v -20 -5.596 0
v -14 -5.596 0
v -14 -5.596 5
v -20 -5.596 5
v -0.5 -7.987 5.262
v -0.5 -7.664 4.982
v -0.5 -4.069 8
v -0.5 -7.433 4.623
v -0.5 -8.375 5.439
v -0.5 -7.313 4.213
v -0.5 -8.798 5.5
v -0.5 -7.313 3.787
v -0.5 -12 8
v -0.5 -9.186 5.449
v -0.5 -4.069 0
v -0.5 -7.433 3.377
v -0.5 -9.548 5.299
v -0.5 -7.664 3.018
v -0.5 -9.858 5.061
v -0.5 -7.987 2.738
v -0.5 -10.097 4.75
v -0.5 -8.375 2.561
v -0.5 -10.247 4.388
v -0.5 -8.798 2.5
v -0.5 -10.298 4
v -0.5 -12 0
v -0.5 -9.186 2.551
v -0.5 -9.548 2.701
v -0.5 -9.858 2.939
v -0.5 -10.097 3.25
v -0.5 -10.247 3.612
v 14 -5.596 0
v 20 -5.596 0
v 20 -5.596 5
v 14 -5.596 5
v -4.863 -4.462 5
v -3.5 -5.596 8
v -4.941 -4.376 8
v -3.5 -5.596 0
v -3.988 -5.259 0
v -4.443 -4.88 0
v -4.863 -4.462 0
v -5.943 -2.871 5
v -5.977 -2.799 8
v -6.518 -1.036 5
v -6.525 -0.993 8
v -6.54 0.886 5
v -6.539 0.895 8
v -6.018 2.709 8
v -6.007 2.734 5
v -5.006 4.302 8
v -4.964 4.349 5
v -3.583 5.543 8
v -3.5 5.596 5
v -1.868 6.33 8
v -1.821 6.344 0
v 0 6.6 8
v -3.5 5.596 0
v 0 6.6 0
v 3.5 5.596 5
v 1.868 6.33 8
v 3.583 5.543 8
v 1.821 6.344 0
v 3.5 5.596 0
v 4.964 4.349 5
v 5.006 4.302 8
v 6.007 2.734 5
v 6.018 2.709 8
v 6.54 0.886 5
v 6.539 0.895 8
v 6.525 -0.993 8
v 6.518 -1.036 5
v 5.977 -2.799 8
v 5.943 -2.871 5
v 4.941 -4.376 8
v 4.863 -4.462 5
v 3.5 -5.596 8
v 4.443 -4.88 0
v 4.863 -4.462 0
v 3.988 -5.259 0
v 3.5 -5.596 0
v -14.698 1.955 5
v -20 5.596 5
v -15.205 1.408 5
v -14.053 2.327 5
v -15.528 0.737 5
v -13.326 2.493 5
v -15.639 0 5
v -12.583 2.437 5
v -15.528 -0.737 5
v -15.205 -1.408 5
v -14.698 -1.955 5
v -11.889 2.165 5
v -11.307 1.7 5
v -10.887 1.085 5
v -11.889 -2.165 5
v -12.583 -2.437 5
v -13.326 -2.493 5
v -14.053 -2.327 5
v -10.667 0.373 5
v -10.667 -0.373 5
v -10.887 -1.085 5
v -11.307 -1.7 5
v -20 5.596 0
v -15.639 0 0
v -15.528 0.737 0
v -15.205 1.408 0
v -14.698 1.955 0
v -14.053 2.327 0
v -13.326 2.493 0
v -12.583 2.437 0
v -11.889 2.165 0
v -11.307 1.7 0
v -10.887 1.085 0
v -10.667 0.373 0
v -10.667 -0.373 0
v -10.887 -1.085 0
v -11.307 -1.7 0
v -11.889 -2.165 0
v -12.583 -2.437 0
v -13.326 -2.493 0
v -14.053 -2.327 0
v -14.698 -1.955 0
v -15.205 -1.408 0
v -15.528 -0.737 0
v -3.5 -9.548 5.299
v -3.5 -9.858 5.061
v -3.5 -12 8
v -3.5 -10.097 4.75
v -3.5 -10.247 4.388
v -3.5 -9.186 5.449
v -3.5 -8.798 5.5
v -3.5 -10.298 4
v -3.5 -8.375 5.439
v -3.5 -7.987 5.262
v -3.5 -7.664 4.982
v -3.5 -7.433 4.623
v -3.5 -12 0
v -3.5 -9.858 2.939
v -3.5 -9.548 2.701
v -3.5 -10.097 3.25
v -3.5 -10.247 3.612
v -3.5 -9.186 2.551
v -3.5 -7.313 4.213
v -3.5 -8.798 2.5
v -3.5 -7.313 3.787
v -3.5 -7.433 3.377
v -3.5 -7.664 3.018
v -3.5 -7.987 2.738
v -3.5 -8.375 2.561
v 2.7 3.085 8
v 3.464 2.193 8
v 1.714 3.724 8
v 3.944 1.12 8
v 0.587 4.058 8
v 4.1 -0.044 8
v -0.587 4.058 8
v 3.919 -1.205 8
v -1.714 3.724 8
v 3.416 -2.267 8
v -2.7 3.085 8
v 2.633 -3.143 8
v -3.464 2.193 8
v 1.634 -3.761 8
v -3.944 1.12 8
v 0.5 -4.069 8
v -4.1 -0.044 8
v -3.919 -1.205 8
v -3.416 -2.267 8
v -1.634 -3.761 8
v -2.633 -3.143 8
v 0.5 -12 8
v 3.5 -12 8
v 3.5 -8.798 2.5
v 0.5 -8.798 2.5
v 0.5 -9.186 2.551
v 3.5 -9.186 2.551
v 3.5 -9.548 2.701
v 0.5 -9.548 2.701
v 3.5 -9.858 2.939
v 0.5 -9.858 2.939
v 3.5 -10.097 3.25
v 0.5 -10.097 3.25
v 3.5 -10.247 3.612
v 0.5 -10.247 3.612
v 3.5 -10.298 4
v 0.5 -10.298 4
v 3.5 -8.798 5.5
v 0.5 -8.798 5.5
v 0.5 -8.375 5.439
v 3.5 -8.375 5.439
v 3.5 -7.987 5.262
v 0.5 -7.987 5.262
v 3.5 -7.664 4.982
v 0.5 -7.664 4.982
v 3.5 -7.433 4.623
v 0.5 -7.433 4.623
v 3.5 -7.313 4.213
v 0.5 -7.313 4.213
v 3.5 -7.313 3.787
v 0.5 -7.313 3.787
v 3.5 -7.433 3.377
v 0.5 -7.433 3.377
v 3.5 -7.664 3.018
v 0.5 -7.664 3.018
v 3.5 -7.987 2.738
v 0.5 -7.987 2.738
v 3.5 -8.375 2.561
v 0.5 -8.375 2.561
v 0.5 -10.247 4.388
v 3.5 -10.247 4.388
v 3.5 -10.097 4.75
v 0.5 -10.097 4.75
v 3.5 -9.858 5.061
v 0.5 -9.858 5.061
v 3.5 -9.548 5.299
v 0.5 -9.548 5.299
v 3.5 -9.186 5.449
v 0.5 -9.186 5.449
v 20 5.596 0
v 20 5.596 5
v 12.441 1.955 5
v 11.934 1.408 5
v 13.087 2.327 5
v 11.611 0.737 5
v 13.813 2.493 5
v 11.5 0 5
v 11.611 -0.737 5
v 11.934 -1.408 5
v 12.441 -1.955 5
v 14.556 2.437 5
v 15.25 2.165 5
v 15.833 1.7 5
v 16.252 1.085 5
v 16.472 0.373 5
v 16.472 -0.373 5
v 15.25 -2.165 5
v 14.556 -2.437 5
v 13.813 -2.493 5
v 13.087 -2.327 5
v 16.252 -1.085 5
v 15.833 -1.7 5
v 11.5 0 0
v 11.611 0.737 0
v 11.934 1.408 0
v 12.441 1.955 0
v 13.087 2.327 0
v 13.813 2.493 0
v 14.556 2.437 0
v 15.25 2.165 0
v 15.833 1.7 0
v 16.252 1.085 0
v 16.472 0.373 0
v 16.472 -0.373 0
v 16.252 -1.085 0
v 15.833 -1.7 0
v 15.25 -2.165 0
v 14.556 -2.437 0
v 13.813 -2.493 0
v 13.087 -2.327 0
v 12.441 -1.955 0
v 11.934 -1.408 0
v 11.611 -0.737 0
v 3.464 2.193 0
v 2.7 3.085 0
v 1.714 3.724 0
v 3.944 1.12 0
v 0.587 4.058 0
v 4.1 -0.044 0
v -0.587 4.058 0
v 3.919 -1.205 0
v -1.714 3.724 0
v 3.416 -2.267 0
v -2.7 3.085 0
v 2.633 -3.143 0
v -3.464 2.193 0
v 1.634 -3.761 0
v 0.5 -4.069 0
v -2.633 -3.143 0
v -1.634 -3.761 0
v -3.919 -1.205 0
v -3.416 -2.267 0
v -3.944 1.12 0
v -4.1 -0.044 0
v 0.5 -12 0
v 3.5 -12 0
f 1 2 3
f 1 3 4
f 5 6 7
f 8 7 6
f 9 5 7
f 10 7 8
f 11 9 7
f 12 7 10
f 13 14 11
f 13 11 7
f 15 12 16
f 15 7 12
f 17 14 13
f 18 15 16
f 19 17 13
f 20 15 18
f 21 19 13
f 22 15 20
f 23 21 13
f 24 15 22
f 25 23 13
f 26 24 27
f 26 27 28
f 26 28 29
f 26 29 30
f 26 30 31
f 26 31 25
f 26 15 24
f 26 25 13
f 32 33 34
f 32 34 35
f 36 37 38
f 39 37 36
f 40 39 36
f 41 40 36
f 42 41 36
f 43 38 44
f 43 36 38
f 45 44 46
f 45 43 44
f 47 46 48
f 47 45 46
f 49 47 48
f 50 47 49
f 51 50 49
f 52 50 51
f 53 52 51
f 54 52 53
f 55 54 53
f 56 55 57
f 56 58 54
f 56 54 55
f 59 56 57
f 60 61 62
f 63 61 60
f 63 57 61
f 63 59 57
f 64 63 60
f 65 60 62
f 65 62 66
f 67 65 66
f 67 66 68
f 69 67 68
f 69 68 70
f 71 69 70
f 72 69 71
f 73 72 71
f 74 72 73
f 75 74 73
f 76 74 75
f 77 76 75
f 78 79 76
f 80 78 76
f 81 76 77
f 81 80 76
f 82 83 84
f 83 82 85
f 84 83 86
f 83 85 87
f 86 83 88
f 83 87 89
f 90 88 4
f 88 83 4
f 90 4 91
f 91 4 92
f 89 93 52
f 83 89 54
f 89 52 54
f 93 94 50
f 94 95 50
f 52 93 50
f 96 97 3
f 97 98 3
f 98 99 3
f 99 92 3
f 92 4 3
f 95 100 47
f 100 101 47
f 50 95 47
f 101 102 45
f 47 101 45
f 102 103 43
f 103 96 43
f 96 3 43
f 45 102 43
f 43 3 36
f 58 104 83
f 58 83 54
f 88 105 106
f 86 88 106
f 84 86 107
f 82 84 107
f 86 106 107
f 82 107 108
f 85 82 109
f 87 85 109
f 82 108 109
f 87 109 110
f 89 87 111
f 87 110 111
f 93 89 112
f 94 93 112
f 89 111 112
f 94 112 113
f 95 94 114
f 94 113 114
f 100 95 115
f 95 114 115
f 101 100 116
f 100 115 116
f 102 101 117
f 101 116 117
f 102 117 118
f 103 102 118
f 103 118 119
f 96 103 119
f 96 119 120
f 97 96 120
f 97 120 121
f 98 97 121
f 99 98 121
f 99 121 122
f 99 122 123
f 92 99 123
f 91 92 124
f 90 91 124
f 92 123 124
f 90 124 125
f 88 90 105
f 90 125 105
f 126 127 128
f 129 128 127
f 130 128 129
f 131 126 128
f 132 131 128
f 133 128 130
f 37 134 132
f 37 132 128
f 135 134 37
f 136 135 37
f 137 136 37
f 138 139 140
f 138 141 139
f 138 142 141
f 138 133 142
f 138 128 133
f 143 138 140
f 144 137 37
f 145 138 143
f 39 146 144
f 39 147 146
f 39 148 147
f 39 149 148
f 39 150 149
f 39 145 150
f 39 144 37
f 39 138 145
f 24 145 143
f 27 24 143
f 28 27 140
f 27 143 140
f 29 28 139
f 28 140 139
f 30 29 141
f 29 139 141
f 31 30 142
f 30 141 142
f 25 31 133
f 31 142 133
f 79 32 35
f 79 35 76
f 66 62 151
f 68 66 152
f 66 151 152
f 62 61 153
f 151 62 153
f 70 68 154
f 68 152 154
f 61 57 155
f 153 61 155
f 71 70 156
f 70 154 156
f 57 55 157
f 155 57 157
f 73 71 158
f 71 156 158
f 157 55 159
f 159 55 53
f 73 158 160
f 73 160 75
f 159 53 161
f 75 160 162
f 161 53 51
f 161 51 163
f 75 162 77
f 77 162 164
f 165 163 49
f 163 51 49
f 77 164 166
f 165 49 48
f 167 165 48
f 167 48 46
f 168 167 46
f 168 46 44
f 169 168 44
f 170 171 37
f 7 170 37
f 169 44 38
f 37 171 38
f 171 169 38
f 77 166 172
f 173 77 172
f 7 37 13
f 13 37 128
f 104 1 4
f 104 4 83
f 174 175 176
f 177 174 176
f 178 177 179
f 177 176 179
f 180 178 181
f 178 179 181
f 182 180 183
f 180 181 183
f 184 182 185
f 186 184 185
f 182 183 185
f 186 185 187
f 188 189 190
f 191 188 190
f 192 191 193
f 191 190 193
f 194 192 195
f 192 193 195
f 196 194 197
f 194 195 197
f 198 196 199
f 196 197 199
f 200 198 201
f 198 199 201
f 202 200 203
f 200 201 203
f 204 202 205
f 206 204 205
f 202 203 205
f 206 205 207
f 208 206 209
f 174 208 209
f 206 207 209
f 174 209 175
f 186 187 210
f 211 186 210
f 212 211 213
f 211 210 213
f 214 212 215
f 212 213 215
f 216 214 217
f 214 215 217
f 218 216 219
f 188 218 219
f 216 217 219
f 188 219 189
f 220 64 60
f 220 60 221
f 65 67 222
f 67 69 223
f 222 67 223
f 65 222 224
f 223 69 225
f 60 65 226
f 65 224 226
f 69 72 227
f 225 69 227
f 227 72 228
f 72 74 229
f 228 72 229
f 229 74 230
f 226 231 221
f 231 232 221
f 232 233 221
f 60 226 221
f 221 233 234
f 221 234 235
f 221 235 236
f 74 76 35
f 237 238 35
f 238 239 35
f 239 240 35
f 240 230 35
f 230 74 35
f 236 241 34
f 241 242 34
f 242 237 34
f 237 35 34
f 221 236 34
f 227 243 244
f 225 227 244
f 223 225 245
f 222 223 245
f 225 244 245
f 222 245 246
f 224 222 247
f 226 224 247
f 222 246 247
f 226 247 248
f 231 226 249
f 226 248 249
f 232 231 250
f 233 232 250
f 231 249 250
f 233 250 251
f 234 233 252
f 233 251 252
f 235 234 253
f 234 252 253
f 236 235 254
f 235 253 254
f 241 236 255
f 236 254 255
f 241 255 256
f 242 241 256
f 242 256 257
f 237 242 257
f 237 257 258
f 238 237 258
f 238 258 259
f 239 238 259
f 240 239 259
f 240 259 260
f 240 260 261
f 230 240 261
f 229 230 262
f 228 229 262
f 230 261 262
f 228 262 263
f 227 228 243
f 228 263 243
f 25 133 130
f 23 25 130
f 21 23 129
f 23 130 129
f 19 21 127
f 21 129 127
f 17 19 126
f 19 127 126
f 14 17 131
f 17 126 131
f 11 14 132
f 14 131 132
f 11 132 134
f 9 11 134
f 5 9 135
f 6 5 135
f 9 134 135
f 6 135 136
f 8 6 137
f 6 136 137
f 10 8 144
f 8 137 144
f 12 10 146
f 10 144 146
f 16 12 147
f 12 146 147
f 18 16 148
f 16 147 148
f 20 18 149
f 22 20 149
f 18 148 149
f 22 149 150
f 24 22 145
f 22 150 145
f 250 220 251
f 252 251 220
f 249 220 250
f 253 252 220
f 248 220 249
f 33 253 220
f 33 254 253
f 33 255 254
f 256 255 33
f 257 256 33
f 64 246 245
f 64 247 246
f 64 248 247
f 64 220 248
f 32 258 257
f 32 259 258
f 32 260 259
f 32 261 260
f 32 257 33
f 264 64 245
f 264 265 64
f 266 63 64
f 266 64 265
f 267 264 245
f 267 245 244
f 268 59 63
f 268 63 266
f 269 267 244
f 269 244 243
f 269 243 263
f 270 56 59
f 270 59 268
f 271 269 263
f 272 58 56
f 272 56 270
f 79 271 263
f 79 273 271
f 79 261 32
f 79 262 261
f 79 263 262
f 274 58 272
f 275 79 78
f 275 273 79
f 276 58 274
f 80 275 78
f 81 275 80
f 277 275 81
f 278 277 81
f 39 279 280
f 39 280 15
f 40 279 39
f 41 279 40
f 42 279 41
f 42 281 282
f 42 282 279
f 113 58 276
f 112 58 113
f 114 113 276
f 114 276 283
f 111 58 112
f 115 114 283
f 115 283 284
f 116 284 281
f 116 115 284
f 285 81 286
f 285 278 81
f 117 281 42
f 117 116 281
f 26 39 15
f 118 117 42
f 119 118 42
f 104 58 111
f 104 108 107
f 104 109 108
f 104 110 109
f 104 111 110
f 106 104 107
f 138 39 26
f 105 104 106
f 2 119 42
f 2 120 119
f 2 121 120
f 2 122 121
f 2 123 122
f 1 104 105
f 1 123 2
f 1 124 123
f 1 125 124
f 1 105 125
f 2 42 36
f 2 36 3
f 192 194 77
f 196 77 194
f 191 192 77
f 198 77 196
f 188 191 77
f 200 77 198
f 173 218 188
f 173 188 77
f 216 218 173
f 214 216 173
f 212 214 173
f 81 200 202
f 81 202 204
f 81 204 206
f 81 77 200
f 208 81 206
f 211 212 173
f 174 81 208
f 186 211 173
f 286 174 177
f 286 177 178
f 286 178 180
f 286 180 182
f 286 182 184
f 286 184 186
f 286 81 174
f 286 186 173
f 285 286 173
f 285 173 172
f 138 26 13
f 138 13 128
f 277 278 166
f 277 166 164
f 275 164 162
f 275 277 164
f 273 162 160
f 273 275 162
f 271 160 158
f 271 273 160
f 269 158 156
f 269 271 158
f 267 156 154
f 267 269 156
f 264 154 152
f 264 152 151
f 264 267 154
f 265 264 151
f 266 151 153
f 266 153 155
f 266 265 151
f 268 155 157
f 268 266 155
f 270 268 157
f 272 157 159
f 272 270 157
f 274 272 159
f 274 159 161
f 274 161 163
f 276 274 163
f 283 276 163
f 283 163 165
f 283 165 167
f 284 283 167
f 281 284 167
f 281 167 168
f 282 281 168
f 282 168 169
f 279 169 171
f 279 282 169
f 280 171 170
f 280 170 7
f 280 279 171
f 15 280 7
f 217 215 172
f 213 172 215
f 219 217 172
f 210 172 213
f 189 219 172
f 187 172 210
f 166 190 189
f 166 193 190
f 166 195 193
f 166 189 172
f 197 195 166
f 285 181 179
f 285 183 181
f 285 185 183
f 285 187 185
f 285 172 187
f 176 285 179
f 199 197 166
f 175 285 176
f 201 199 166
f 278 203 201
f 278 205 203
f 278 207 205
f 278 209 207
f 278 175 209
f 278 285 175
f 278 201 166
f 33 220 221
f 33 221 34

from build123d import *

# Parameters (mm, degrees)
BOSS_EXTRUDE1_DEPTH = 8
CUT_EXTRUDE1_DEPTH  = 8
SKETCH4_R           = 2.5
BOSS_EXTRUDE2_DEPTH = 5


with BuildPart() as part:
    # Sketch1 → Boss-Extrude1 (new body)
    with BuildSketch(Plane(origin=(0, 0, 0), x_dir=(0, 1, 0), z_dir=(0, 0, 1))):
        with BuildLine():
            Line((-12, 3.5), (-5.595533933, 3.5))
            ThreePointArc((-5.595533933, 3.5), (6.6, 0), (-5.595533933, -3.5))
            Line((-5.595533933, -3.5), (-12, -3.5))
            Line((-12, -3.5), (-12, -0.5))
            Line((-12, -0.5), (-4.06939799, -0.5))
            ThreePointArc((-4.06939799, -0.5), (4.1, 0), (-4.06939799, 0.5))
            Line((-4.06939799, 0.5), (-12, 0.5))
            Line((-12, 0.5), (-12, 3.5))
        make_face()
    extrude(amount=BOSS_EXTRUDE1_DEPTH)

    # Sketch2 → Cut-Extrude1 (cut)
    with BuildSketch(Plane(origin=(-3.5, 0, 0), x_dir=(0, -1, 0), z_dir=(-1, 0, 0))):
        with BuildLine():
            ThreePointArc((10.297766967, 4), (9.858427138, 5.060660172), (8.797766967, 5.5))
            Line((8.797766967, 5.5), (8.797766967, 2.5))
            ThreePointArc((8.797766967, 2.5), (9.858427138, 2.939339828), (10.297766967, 4))
        make_face()
        with BuildLine():
            Line((8.797766967, 2.5), (8.797766967, 5.5))
            ThreePointArc((8.797766967, 5.5), (7.297766967, 4), (8.797766967, 2.5))
        make_face()
    extrude(amount=-CUT_EXTRUDE1_DEPTH, mode=Mode.SUBTRACT)

    # Sketch4 → Boss-Extrude2 (add)
    # profile 1 of 2: a face of its own
    with BuildSketch(Plane(origin=(0, 0, 0), x_dir=(1, 0, 0), z_dir=(0, 0, -1))):
        with BuildLine():
            Line((20, 5.595533933), (14, 5.595533933))
            Line((14, 5.595533933), (4.863001587, 4.462198513))
            ThreePointArc((4.863001587, 4.462198513), (6.540217456, -0.886315759), (3.5, -5.595533933))
            Line((3.5, -5.595533933), (20, -5.595533933))
            Line((20, -5.595533933), (20, 5.595533933))
        make_face()
        with Locations(Location((14, 0, 0), (0, 0, 180))):
            Circle(SKETCH4_R, mode=Mode.SUBTRACT)
    # profile 2 of 2: a face of its own
    with BuildSketch(Plane(origin=(0, 0, 0), x_dir=(1, 0, 0), z_dir=(0, 0, -1))):
        with BuildLine():
            Line((-20, -5.595533933), (-3.5, -5.595533933))
            ThreePointArc((-3.5, -5.595533933), (-6.540217456, -0.886315759), (-4.863001587, 4.462198513))
            Line((-4.863001587, 4.462198513), (-14, 5.595533933))
            Line((-14, 5.595533933), (-20, 5.595533933))
            Line((-20, 5.595533933), (-20, -5.595533933))
        make_face()
        with Locations(Location((-13.139356118, 0, 0), (0, 0, 180))):
            Circle(SKETCH4_R, mode=Mode.SUBTRACT)
    extrude(amount=-BOSS_EXTRUDE2_DEPTH)


solid = part.part
